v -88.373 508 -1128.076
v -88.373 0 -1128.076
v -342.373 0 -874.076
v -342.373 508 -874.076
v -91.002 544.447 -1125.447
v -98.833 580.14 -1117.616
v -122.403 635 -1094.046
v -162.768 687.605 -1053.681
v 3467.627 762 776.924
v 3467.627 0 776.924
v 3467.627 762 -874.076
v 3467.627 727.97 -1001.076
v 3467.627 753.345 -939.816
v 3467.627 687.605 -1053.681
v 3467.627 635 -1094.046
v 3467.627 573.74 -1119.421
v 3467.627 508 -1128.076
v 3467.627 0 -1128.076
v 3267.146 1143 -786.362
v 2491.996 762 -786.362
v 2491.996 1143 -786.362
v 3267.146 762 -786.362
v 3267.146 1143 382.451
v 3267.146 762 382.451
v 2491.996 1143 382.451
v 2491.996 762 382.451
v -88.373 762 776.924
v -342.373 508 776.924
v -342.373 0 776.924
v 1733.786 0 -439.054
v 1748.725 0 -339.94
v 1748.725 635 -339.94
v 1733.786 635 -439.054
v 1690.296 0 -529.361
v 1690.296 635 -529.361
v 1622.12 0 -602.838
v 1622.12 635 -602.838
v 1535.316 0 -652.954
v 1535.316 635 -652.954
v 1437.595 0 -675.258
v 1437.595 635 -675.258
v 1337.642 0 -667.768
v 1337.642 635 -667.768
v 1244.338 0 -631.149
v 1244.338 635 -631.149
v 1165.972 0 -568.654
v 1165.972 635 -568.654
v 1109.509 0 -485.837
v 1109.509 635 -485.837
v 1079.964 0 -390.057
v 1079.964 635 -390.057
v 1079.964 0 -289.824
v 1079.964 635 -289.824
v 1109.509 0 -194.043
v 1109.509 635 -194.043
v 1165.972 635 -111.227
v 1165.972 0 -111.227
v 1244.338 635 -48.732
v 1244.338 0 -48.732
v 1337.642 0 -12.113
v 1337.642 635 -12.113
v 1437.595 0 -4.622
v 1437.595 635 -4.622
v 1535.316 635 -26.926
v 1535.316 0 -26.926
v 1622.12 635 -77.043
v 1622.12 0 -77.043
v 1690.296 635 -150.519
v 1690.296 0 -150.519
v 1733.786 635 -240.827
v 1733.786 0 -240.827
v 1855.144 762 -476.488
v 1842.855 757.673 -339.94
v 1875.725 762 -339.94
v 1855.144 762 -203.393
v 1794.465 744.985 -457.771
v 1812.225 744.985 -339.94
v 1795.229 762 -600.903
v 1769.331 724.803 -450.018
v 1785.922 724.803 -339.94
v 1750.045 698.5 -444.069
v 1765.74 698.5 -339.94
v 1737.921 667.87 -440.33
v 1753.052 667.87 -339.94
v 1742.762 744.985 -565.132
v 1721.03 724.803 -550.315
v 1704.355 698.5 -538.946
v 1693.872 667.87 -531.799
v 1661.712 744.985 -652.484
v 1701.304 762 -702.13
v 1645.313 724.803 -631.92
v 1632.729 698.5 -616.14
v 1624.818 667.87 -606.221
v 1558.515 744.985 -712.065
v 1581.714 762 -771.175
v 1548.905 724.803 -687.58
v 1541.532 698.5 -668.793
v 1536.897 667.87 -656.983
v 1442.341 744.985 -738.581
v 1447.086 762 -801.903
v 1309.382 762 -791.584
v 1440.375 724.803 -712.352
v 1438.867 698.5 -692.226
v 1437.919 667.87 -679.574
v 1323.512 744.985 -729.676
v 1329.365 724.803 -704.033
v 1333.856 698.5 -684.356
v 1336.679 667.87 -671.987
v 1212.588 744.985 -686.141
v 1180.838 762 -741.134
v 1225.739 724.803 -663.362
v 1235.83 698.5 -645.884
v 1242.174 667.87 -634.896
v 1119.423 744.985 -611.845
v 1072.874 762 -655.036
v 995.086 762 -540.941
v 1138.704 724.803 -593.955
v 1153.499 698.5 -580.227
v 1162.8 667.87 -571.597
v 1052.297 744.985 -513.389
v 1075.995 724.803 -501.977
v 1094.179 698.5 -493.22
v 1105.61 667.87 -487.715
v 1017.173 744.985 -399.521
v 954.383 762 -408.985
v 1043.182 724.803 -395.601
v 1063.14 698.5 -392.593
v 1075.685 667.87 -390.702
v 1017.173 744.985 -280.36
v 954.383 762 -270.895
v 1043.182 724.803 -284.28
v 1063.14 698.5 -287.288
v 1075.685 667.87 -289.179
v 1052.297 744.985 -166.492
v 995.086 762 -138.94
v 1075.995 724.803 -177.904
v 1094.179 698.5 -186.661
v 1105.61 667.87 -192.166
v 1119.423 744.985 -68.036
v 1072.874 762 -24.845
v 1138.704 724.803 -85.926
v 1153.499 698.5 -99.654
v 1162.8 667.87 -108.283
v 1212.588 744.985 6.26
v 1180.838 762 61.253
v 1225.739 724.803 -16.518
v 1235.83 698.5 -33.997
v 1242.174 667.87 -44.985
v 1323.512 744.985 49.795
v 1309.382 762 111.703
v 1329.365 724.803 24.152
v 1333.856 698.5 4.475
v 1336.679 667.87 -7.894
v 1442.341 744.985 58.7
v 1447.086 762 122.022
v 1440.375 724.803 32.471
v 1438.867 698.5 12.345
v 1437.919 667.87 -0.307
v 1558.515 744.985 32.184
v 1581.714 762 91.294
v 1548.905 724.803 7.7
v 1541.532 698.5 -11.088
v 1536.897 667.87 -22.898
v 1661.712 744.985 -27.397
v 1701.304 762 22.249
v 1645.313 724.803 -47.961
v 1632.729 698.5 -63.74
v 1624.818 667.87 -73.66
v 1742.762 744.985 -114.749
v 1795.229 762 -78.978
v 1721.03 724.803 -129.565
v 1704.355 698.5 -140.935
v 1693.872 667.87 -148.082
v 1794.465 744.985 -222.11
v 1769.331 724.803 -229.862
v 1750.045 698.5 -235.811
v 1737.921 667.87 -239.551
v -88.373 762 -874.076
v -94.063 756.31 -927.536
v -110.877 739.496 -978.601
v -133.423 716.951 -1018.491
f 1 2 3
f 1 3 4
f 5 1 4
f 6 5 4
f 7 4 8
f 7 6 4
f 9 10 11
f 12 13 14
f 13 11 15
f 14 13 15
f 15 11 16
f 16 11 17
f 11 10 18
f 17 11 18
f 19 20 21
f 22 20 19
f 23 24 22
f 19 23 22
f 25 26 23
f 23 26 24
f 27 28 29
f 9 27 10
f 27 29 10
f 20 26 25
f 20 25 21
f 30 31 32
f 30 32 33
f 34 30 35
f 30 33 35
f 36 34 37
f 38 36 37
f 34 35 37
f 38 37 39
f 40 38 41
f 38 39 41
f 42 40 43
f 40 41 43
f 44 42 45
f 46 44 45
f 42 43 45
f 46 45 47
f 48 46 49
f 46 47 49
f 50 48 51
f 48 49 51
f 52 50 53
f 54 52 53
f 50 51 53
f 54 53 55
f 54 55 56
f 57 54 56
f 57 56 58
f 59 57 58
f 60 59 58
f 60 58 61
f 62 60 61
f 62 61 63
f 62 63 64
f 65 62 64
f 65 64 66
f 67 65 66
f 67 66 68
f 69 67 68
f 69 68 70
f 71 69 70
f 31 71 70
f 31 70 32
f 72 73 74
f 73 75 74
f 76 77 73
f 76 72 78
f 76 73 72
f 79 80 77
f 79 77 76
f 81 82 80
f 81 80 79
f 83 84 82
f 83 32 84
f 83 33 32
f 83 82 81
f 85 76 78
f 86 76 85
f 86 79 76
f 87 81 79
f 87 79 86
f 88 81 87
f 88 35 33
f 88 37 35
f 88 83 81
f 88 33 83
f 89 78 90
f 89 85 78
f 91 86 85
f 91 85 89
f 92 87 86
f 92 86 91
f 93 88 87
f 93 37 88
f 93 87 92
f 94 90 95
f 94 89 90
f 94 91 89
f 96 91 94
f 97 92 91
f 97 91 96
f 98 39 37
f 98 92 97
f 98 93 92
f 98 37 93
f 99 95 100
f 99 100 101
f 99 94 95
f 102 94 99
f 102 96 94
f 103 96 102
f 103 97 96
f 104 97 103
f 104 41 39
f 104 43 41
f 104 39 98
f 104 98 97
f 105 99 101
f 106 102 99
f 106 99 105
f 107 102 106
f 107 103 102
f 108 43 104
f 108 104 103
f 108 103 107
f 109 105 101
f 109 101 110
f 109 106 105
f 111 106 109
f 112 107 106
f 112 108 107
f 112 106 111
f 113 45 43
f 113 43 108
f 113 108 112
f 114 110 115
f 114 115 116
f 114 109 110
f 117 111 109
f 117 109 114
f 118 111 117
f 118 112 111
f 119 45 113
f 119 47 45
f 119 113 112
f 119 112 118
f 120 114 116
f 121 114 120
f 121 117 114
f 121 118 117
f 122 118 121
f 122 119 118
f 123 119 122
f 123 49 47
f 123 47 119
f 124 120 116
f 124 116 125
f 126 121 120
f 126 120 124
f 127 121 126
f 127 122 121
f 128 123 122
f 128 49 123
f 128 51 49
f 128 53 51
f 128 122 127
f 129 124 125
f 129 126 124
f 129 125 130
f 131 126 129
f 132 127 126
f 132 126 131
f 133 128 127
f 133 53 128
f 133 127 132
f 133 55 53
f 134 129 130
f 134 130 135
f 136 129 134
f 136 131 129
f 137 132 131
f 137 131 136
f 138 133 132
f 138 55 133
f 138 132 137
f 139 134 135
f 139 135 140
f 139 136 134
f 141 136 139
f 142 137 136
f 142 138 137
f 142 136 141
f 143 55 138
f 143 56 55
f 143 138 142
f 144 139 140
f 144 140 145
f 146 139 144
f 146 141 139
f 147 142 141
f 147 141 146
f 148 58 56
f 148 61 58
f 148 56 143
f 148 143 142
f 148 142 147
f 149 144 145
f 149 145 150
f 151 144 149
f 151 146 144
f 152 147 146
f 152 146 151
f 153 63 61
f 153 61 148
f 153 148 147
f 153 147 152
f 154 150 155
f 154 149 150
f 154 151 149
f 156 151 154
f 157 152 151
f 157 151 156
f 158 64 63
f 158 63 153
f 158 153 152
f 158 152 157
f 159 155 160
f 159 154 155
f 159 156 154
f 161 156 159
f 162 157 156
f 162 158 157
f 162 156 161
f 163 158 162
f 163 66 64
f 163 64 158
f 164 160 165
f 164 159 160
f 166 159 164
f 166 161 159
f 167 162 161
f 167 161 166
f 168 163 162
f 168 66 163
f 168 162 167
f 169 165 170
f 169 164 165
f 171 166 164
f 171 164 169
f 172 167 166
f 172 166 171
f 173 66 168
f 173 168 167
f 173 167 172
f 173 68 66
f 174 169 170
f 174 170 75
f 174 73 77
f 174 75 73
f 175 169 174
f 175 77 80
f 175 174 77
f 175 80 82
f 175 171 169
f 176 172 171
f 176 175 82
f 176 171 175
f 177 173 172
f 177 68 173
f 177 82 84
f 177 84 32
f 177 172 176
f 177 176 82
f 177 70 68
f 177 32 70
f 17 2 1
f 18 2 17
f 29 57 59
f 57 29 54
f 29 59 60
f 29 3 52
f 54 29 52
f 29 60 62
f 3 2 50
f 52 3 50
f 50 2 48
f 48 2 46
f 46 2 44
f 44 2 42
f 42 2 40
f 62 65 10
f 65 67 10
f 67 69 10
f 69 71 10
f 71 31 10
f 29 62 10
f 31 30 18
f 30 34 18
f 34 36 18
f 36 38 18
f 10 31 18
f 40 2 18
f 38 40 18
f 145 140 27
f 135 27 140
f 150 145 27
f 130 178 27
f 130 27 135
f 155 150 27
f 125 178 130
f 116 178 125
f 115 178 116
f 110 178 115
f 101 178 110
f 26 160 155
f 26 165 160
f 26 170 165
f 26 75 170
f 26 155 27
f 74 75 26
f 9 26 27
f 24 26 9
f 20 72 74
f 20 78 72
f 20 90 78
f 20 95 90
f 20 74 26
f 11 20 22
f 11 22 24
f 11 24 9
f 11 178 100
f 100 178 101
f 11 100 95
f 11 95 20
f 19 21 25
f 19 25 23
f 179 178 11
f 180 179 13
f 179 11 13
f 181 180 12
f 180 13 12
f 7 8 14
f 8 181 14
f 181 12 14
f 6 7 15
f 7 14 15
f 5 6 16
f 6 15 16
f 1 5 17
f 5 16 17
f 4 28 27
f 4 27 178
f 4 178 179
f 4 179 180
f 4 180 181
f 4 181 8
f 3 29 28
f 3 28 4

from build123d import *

# Parameters (mm, degrees)
SKETCH1_W           = 3810
SKETCH1_H           = 1905
BOSS_EXTRUDE1_DEPTH = 762
SKETCH2_R           = 336.258211588
CUT_EXTRUDE1_DEPTH  = 763
SKETCH3_W           = 775.150416673
SKETCH3_H           = 1168.813193726
BOSS_EXTRUDE2_DEPTH = 381
FILLET1_R           = 127
CHAMFER3_SIZE       = 254
FILLET3_R           = 254
CHAMFER4_SIZE       = 254


with BuildPart() as part:
    # Sketch1 → Boss-Extrude1 (new body)
    with BuildSketch(Plane(origin=(0, 0, 0), x_dir=(1, 0, 0), z_dir=(0, 1, 0))):
        with Locations((1562.626728111, 175.576036866)):
            Rectangle(SKETCH1_W, SKETCH1_H)
    extrude(amount=BOSS_EXTRUDE1_DEPTH)

    # Sketch2 → Cut-Extrude1 (cut, through all)
    with BuildSketch(Plane(origin=(0, 762, 0), x_dir=(1, 0, 0), z_dir=(0, 1, 0))):
        with Locations((1412.4667322, 339.940416015)):
            Circle(SKETCH2_R)
    extrude(amount=-CUT_EXTRUDE1_DEPTH, mode=Mode.SUBTRACT)

    # Sketch3 → Boss-Extrude2 (add)
    with BuildSketch(Plane(origin=(0, 762, 0), x_dir=(1, 0, 0), z_dir=(0, 1, 0))):
        with Locations((2879.570760626, 201.955501308)):
            Rectangle(SKETCH3_W, SKETCH3_H)
    extrude(amount=BOSS_EXTRUDE2_DEPTH)

    # Fillet1
    fillet1_edges = [part.edges().sort_by_distance(p)[0] for p in [
        (1076.208520612, 762, -339.940416015),
    ]]
    fillet(fillet1_edges, radius=FILLET1_R)

    # Chamfer3
    chamfer3_edges = [part.edges().sort_by_distance(p)[0] for p in [
        (-342.373271889, 381, -1128.076036866),
    ]]
    chamfer(chamfer3_edges, length=CHAMFER3_SIZE)

    # Fillet3
    fillet3_edges = [part.edges().sort_by_distance(p)[0] for p in [
        (1689.626728111, 762, -1128.076036866),
    ]]
    fillet(fillet3_edges, radius=FILLET3_R)

    # Chamfer4
    chamfer4_edges = [part.edges().sort_by_distance(p)[0] for p in [
        (-342.373271889, 762, -48.576036866),
    ]]
    chamfer(chamfer4_edges, length=CHAMFER4_SIZE)


solid = part.part
